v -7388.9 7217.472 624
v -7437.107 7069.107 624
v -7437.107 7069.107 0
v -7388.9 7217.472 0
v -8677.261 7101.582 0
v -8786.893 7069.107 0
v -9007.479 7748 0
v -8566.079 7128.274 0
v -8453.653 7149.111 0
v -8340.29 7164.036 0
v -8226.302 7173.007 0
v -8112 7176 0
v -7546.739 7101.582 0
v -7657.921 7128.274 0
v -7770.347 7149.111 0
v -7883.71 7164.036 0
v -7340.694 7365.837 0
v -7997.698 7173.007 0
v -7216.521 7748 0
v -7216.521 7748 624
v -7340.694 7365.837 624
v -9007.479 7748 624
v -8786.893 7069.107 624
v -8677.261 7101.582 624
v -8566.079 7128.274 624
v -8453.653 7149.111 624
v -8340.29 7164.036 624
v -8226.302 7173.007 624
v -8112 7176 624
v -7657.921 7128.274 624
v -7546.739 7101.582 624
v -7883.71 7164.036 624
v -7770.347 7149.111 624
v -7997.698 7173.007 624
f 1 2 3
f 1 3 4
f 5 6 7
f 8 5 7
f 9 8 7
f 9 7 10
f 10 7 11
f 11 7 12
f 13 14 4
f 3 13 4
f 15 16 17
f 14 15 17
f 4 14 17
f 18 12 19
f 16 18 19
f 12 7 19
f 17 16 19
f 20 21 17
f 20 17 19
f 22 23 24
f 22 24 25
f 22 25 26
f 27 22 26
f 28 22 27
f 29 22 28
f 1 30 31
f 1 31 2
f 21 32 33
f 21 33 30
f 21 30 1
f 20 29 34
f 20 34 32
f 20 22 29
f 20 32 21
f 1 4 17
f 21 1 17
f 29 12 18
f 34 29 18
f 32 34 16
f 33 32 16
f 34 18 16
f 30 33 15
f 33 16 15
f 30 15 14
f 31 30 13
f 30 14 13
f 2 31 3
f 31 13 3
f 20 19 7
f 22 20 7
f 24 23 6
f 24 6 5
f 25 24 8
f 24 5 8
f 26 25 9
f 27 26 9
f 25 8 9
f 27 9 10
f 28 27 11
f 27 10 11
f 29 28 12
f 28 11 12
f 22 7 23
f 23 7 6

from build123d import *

# Parameters (mm, degrees)
EXTRUDE_1_DEPTH = 480
SCALE_1_SCALE   = 1.3


with BuildPart() as part:
    # 草图1 → 凸台-拉伸1 (new body)
    with BuildSketch(Plane.XY):
        with BuildLine():
            Line((-6833.3126292, 5666.028511287), (-6759.14855055, 5437.774947376))
            ThreePointArc((-6759.14855055, 5437.774947376), (-6502.809901268, 5499.3164122), (-6240, 5520))
            Line((-6240, 5520), (-6240, 5760))
            ThreePointArc((-6240, 5760), (-6540.354172877, 5736.361613943), (-6833.3126292, 5666.028511287))
        make_face()
        with BuildLine():
            ThreePointArc((-6240, 5520), (-5977.190098732, 5499.3164122), (-5720.85144945, 5437.774947376))
            Line((-5720.85144945, 5437.774947376), (-5683.769410125, 5551.901729331))
            Line((-5683.769410125, 5551.901729331), (-5646.6873708, 5666.028511287))
            ThreePointArc((-5646.6873708, 5666.028511287), (-5939.645827123, 5736.361613943), (-6240, 5760))
            Line((-6240, 5760), (-6240, 5520))
        make_face()
        with BuildLine():
            ThreePointArc((-6240, 5760), (-5939.645827123, 5736.361613943), (-5646.6873708, 5666.028511287))
            Line((-5646.6873708, 5666.028511287), (-5551.170243986, 5960))
            Line((-5551.170243986, 5960), (-6928.829756014, 5960))
            Line((-6928.829756014, 5960), (-6833.3126292, 5666.028511287))
            ThreePointArc((-6833.3126292, 5666.028511287), (-6540.354172877, 5736.361613943), (-6240, 5760))
        make_face()
    extrude(amount=EXTRUDE_1_DEPTH)


with BuildPart() as part_1:
    # 缩放比例1: scaled about (0, 0, 0)
    add(part.part.scale(SCALE_1_SCALE))


solid = part_1.part
